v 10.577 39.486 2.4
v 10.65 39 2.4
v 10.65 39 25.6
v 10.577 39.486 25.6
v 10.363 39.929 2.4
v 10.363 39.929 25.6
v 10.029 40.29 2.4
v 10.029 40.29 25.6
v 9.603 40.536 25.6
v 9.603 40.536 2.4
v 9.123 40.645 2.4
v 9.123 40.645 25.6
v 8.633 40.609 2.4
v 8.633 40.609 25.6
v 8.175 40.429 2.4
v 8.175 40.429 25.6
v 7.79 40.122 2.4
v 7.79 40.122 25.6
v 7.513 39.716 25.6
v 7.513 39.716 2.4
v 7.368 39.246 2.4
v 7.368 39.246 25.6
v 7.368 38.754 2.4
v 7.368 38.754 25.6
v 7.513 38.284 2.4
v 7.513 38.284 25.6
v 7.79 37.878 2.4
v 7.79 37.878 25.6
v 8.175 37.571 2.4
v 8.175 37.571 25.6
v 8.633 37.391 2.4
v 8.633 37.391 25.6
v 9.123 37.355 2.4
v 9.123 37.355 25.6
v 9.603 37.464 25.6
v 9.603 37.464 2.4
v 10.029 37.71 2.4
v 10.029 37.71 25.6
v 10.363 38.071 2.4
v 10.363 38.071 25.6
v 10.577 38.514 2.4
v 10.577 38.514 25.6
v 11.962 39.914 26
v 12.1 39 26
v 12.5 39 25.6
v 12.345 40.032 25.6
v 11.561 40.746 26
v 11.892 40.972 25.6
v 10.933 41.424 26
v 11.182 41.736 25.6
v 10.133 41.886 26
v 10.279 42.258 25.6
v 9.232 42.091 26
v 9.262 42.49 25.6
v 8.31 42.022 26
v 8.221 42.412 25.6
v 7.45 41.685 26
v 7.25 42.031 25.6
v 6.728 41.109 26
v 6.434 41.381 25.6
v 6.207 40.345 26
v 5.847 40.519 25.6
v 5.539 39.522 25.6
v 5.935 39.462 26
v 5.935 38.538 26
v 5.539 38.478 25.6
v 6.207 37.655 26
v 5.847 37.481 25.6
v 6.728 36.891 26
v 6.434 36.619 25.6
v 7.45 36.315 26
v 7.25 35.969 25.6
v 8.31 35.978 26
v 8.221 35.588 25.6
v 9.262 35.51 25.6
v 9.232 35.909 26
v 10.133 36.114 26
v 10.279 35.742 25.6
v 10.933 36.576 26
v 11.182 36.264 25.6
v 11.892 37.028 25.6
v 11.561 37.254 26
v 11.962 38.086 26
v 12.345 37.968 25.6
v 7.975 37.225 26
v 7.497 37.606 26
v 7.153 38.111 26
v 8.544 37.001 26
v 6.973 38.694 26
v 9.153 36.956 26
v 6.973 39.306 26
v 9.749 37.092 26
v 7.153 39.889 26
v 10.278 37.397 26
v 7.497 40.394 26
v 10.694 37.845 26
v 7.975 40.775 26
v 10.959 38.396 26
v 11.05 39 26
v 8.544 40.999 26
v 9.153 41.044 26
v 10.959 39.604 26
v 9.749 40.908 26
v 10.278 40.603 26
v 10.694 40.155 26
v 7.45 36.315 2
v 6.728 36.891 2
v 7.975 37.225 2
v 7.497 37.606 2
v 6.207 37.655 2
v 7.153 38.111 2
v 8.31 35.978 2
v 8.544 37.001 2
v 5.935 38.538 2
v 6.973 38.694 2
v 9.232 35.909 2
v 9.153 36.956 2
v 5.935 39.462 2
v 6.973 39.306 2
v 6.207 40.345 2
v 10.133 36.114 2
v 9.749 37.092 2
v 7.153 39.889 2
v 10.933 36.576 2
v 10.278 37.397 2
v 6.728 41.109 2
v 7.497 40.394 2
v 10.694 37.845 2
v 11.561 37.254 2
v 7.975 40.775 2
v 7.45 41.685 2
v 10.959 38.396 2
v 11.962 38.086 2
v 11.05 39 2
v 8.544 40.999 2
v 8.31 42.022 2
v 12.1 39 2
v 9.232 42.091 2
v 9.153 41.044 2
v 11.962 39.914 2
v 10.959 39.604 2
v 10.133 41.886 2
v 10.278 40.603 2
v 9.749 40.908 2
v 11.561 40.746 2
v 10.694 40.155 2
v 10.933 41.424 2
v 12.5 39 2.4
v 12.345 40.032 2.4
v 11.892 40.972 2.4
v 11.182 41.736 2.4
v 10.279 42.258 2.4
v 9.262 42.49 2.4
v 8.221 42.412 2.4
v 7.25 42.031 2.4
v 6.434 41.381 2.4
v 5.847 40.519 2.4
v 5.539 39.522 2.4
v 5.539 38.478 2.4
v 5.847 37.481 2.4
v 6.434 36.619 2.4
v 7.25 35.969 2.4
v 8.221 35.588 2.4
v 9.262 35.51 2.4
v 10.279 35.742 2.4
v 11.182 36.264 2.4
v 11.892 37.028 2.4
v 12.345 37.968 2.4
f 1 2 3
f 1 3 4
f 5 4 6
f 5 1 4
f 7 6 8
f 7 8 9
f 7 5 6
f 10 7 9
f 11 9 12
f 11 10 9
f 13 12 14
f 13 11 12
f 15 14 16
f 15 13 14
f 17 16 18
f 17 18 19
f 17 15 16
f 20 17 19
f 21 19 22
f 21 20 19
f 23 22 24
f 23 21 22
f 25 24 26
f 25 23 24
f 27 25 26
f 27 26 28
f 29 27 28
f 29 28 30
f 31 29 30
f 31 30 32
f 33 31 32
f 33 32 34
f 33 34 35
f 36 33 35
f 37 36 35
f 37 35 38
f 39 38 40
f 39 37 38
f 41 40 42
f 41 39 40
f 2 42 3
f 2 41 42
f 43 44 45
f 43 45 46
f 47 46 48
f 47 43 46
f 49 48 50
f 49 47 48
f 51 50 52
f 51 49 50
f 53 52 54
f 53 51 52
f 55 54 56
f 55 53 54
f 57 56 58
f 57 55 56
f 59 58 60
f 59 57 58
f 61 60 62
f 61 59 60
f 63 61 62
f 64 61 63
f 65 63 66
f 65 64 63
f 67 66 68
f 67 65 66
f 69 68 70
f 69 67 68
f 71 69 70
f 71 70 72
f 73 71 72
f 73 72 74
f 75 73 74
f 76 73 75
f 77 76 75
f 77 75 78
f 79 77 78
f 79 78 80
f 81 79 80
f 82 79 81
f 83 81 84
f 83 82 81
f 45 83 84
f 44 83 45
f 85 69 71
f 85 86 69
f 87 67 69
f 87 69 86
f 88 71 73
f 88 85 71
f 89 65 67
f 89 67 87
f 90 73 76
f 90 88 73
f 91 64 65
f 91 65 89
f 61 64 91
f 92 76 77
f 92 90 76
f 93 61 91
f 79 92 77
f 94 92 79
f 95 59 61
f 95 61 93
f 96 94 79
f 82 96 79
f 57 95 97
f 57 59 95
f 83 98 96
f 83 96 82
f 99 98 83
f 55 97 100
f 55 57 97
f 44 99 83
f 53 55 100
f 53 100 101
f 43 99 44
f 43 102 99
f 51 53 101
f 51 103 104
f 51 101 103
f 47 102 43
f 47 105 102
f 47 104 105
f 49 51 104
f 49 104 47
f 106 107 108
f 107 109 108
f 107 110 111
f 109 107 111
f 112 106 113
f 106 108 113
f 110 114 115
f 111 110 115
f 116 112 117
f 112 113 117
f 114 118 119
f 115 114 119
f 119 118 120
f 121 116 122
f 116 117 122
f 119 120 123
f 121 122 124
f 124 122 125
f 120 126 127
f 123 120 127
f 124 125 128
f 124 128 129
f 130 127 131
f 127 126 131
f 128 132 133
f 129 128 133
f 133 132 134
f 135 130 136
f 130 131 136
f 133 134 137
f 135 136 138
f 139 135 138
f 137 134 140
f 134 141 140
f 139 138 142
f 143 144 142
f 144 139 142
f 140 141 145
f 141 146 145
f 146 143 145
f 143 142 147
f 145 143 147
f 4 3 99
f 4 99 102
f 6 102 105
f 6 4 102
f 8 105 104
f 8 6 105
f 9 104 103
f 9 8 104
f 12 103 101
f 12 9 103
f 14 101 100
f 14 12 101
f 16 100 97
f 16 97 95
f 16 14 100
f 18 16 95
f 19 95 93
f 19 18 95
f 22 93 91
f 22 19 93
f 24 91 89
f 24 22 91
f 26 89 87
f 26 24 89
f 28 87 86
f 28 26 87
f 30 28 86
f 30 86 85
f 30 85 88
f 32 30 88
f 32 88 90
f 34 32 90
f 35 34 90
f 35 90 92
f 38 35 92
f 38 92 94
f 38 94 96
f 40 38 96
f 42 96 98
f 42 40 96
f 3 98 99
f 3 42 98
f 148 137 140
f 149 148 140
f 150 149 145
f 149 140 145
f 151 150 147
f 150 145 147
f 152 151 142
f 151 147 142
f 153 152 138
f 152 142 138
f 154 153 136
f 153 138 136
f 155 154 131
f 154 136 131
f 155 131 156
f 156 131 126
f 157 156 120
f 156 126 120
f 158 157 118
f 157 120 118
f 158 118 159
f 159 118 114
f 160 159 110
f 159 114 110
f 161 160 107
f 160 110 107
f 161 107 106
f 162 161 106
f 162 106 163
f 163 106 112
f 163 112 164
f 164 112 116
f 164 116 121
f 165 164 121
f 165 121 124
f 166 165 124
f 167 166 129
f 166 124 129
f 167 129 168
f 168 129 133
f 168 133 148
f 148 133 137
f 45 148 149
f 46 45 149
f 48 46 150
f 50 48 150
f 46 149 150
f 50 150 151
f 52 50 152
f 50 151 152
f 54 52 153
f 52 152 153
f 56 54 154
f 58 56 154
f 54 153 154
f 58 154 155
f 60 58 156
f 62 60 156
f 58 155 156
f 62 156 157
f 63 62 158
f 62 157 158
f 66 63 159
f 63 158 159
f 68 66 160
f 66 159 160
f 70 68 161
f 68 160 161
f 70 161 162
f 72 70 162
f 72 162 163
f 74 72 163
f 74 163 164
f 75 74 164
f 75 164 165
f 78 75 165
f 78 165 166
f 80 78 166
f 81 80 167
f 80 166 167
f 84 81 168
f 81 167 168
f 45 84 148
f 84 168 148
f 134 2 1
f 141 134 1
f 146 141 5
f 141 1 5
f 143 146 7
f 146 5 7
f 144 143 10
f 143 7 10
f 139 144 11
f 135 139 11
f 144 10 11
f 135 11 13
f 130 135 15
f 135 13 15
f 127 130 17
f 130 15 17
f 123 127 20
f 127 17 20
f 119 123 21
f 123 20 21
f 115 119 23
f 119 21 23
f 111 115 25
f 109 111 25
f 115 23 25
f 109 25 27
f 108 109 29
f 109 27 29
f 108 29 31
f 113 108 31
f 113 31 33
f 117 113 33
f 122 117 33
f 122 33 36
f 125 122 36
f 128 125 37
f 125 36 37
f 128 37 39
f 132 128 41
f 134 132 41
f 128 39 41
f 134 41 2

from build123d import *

# Parameters (mm, degrees)
CYLINDER009_R         = 1.65
CYLINDER009_DEPTH     = 24
CYLINDER008_R         = 3.5
CYLINDER008_DEPTH     = 24
CHAMFER020026006_SIZE = 0.4


with BuildPart() as cylinder009:
    # Cylinder009 → Cylinder009 (new body)
    with BuildSketch(Plane(origin=(9, 39, 2), x_dir=(1, 0, 0), z_dir=(0, 0, 1))):
        Circle(CYLINDER009_R)
    extrude(amount=CYLINDER009_DEPTH)


with BuildPart() as chamfer020026006:
    # Cylinder008 → Cylinder008 (new body)
    with BuildSketch(Plane(origin=(9, 39, 2), x_dir=(1, 0, 0), z_dir=(0, 0, 1))):
        Circle(CYLINDER008_R)
    extrude(amount=CYLINDER008_DEPTH)

    # Cut002002002007004004001006014: cut Cylinder009
    add(cylinder009.part, mode=Mode.SUBTRACT)

    # Chamfer020026006
    chamfer020026006_edges = [chamfer020026006.edges().sort_by_distance(p)[0] for p in [
        (5.5, 39, 26),
        (5.5, 39, 2),
        (7.35, 39, 26),
        (7.35, 39, 2),
    ]]
    chamfer(chamfer020026006_edges, length=CHAMFER020026006_SIZE)


solid = chamfer020026006.part
